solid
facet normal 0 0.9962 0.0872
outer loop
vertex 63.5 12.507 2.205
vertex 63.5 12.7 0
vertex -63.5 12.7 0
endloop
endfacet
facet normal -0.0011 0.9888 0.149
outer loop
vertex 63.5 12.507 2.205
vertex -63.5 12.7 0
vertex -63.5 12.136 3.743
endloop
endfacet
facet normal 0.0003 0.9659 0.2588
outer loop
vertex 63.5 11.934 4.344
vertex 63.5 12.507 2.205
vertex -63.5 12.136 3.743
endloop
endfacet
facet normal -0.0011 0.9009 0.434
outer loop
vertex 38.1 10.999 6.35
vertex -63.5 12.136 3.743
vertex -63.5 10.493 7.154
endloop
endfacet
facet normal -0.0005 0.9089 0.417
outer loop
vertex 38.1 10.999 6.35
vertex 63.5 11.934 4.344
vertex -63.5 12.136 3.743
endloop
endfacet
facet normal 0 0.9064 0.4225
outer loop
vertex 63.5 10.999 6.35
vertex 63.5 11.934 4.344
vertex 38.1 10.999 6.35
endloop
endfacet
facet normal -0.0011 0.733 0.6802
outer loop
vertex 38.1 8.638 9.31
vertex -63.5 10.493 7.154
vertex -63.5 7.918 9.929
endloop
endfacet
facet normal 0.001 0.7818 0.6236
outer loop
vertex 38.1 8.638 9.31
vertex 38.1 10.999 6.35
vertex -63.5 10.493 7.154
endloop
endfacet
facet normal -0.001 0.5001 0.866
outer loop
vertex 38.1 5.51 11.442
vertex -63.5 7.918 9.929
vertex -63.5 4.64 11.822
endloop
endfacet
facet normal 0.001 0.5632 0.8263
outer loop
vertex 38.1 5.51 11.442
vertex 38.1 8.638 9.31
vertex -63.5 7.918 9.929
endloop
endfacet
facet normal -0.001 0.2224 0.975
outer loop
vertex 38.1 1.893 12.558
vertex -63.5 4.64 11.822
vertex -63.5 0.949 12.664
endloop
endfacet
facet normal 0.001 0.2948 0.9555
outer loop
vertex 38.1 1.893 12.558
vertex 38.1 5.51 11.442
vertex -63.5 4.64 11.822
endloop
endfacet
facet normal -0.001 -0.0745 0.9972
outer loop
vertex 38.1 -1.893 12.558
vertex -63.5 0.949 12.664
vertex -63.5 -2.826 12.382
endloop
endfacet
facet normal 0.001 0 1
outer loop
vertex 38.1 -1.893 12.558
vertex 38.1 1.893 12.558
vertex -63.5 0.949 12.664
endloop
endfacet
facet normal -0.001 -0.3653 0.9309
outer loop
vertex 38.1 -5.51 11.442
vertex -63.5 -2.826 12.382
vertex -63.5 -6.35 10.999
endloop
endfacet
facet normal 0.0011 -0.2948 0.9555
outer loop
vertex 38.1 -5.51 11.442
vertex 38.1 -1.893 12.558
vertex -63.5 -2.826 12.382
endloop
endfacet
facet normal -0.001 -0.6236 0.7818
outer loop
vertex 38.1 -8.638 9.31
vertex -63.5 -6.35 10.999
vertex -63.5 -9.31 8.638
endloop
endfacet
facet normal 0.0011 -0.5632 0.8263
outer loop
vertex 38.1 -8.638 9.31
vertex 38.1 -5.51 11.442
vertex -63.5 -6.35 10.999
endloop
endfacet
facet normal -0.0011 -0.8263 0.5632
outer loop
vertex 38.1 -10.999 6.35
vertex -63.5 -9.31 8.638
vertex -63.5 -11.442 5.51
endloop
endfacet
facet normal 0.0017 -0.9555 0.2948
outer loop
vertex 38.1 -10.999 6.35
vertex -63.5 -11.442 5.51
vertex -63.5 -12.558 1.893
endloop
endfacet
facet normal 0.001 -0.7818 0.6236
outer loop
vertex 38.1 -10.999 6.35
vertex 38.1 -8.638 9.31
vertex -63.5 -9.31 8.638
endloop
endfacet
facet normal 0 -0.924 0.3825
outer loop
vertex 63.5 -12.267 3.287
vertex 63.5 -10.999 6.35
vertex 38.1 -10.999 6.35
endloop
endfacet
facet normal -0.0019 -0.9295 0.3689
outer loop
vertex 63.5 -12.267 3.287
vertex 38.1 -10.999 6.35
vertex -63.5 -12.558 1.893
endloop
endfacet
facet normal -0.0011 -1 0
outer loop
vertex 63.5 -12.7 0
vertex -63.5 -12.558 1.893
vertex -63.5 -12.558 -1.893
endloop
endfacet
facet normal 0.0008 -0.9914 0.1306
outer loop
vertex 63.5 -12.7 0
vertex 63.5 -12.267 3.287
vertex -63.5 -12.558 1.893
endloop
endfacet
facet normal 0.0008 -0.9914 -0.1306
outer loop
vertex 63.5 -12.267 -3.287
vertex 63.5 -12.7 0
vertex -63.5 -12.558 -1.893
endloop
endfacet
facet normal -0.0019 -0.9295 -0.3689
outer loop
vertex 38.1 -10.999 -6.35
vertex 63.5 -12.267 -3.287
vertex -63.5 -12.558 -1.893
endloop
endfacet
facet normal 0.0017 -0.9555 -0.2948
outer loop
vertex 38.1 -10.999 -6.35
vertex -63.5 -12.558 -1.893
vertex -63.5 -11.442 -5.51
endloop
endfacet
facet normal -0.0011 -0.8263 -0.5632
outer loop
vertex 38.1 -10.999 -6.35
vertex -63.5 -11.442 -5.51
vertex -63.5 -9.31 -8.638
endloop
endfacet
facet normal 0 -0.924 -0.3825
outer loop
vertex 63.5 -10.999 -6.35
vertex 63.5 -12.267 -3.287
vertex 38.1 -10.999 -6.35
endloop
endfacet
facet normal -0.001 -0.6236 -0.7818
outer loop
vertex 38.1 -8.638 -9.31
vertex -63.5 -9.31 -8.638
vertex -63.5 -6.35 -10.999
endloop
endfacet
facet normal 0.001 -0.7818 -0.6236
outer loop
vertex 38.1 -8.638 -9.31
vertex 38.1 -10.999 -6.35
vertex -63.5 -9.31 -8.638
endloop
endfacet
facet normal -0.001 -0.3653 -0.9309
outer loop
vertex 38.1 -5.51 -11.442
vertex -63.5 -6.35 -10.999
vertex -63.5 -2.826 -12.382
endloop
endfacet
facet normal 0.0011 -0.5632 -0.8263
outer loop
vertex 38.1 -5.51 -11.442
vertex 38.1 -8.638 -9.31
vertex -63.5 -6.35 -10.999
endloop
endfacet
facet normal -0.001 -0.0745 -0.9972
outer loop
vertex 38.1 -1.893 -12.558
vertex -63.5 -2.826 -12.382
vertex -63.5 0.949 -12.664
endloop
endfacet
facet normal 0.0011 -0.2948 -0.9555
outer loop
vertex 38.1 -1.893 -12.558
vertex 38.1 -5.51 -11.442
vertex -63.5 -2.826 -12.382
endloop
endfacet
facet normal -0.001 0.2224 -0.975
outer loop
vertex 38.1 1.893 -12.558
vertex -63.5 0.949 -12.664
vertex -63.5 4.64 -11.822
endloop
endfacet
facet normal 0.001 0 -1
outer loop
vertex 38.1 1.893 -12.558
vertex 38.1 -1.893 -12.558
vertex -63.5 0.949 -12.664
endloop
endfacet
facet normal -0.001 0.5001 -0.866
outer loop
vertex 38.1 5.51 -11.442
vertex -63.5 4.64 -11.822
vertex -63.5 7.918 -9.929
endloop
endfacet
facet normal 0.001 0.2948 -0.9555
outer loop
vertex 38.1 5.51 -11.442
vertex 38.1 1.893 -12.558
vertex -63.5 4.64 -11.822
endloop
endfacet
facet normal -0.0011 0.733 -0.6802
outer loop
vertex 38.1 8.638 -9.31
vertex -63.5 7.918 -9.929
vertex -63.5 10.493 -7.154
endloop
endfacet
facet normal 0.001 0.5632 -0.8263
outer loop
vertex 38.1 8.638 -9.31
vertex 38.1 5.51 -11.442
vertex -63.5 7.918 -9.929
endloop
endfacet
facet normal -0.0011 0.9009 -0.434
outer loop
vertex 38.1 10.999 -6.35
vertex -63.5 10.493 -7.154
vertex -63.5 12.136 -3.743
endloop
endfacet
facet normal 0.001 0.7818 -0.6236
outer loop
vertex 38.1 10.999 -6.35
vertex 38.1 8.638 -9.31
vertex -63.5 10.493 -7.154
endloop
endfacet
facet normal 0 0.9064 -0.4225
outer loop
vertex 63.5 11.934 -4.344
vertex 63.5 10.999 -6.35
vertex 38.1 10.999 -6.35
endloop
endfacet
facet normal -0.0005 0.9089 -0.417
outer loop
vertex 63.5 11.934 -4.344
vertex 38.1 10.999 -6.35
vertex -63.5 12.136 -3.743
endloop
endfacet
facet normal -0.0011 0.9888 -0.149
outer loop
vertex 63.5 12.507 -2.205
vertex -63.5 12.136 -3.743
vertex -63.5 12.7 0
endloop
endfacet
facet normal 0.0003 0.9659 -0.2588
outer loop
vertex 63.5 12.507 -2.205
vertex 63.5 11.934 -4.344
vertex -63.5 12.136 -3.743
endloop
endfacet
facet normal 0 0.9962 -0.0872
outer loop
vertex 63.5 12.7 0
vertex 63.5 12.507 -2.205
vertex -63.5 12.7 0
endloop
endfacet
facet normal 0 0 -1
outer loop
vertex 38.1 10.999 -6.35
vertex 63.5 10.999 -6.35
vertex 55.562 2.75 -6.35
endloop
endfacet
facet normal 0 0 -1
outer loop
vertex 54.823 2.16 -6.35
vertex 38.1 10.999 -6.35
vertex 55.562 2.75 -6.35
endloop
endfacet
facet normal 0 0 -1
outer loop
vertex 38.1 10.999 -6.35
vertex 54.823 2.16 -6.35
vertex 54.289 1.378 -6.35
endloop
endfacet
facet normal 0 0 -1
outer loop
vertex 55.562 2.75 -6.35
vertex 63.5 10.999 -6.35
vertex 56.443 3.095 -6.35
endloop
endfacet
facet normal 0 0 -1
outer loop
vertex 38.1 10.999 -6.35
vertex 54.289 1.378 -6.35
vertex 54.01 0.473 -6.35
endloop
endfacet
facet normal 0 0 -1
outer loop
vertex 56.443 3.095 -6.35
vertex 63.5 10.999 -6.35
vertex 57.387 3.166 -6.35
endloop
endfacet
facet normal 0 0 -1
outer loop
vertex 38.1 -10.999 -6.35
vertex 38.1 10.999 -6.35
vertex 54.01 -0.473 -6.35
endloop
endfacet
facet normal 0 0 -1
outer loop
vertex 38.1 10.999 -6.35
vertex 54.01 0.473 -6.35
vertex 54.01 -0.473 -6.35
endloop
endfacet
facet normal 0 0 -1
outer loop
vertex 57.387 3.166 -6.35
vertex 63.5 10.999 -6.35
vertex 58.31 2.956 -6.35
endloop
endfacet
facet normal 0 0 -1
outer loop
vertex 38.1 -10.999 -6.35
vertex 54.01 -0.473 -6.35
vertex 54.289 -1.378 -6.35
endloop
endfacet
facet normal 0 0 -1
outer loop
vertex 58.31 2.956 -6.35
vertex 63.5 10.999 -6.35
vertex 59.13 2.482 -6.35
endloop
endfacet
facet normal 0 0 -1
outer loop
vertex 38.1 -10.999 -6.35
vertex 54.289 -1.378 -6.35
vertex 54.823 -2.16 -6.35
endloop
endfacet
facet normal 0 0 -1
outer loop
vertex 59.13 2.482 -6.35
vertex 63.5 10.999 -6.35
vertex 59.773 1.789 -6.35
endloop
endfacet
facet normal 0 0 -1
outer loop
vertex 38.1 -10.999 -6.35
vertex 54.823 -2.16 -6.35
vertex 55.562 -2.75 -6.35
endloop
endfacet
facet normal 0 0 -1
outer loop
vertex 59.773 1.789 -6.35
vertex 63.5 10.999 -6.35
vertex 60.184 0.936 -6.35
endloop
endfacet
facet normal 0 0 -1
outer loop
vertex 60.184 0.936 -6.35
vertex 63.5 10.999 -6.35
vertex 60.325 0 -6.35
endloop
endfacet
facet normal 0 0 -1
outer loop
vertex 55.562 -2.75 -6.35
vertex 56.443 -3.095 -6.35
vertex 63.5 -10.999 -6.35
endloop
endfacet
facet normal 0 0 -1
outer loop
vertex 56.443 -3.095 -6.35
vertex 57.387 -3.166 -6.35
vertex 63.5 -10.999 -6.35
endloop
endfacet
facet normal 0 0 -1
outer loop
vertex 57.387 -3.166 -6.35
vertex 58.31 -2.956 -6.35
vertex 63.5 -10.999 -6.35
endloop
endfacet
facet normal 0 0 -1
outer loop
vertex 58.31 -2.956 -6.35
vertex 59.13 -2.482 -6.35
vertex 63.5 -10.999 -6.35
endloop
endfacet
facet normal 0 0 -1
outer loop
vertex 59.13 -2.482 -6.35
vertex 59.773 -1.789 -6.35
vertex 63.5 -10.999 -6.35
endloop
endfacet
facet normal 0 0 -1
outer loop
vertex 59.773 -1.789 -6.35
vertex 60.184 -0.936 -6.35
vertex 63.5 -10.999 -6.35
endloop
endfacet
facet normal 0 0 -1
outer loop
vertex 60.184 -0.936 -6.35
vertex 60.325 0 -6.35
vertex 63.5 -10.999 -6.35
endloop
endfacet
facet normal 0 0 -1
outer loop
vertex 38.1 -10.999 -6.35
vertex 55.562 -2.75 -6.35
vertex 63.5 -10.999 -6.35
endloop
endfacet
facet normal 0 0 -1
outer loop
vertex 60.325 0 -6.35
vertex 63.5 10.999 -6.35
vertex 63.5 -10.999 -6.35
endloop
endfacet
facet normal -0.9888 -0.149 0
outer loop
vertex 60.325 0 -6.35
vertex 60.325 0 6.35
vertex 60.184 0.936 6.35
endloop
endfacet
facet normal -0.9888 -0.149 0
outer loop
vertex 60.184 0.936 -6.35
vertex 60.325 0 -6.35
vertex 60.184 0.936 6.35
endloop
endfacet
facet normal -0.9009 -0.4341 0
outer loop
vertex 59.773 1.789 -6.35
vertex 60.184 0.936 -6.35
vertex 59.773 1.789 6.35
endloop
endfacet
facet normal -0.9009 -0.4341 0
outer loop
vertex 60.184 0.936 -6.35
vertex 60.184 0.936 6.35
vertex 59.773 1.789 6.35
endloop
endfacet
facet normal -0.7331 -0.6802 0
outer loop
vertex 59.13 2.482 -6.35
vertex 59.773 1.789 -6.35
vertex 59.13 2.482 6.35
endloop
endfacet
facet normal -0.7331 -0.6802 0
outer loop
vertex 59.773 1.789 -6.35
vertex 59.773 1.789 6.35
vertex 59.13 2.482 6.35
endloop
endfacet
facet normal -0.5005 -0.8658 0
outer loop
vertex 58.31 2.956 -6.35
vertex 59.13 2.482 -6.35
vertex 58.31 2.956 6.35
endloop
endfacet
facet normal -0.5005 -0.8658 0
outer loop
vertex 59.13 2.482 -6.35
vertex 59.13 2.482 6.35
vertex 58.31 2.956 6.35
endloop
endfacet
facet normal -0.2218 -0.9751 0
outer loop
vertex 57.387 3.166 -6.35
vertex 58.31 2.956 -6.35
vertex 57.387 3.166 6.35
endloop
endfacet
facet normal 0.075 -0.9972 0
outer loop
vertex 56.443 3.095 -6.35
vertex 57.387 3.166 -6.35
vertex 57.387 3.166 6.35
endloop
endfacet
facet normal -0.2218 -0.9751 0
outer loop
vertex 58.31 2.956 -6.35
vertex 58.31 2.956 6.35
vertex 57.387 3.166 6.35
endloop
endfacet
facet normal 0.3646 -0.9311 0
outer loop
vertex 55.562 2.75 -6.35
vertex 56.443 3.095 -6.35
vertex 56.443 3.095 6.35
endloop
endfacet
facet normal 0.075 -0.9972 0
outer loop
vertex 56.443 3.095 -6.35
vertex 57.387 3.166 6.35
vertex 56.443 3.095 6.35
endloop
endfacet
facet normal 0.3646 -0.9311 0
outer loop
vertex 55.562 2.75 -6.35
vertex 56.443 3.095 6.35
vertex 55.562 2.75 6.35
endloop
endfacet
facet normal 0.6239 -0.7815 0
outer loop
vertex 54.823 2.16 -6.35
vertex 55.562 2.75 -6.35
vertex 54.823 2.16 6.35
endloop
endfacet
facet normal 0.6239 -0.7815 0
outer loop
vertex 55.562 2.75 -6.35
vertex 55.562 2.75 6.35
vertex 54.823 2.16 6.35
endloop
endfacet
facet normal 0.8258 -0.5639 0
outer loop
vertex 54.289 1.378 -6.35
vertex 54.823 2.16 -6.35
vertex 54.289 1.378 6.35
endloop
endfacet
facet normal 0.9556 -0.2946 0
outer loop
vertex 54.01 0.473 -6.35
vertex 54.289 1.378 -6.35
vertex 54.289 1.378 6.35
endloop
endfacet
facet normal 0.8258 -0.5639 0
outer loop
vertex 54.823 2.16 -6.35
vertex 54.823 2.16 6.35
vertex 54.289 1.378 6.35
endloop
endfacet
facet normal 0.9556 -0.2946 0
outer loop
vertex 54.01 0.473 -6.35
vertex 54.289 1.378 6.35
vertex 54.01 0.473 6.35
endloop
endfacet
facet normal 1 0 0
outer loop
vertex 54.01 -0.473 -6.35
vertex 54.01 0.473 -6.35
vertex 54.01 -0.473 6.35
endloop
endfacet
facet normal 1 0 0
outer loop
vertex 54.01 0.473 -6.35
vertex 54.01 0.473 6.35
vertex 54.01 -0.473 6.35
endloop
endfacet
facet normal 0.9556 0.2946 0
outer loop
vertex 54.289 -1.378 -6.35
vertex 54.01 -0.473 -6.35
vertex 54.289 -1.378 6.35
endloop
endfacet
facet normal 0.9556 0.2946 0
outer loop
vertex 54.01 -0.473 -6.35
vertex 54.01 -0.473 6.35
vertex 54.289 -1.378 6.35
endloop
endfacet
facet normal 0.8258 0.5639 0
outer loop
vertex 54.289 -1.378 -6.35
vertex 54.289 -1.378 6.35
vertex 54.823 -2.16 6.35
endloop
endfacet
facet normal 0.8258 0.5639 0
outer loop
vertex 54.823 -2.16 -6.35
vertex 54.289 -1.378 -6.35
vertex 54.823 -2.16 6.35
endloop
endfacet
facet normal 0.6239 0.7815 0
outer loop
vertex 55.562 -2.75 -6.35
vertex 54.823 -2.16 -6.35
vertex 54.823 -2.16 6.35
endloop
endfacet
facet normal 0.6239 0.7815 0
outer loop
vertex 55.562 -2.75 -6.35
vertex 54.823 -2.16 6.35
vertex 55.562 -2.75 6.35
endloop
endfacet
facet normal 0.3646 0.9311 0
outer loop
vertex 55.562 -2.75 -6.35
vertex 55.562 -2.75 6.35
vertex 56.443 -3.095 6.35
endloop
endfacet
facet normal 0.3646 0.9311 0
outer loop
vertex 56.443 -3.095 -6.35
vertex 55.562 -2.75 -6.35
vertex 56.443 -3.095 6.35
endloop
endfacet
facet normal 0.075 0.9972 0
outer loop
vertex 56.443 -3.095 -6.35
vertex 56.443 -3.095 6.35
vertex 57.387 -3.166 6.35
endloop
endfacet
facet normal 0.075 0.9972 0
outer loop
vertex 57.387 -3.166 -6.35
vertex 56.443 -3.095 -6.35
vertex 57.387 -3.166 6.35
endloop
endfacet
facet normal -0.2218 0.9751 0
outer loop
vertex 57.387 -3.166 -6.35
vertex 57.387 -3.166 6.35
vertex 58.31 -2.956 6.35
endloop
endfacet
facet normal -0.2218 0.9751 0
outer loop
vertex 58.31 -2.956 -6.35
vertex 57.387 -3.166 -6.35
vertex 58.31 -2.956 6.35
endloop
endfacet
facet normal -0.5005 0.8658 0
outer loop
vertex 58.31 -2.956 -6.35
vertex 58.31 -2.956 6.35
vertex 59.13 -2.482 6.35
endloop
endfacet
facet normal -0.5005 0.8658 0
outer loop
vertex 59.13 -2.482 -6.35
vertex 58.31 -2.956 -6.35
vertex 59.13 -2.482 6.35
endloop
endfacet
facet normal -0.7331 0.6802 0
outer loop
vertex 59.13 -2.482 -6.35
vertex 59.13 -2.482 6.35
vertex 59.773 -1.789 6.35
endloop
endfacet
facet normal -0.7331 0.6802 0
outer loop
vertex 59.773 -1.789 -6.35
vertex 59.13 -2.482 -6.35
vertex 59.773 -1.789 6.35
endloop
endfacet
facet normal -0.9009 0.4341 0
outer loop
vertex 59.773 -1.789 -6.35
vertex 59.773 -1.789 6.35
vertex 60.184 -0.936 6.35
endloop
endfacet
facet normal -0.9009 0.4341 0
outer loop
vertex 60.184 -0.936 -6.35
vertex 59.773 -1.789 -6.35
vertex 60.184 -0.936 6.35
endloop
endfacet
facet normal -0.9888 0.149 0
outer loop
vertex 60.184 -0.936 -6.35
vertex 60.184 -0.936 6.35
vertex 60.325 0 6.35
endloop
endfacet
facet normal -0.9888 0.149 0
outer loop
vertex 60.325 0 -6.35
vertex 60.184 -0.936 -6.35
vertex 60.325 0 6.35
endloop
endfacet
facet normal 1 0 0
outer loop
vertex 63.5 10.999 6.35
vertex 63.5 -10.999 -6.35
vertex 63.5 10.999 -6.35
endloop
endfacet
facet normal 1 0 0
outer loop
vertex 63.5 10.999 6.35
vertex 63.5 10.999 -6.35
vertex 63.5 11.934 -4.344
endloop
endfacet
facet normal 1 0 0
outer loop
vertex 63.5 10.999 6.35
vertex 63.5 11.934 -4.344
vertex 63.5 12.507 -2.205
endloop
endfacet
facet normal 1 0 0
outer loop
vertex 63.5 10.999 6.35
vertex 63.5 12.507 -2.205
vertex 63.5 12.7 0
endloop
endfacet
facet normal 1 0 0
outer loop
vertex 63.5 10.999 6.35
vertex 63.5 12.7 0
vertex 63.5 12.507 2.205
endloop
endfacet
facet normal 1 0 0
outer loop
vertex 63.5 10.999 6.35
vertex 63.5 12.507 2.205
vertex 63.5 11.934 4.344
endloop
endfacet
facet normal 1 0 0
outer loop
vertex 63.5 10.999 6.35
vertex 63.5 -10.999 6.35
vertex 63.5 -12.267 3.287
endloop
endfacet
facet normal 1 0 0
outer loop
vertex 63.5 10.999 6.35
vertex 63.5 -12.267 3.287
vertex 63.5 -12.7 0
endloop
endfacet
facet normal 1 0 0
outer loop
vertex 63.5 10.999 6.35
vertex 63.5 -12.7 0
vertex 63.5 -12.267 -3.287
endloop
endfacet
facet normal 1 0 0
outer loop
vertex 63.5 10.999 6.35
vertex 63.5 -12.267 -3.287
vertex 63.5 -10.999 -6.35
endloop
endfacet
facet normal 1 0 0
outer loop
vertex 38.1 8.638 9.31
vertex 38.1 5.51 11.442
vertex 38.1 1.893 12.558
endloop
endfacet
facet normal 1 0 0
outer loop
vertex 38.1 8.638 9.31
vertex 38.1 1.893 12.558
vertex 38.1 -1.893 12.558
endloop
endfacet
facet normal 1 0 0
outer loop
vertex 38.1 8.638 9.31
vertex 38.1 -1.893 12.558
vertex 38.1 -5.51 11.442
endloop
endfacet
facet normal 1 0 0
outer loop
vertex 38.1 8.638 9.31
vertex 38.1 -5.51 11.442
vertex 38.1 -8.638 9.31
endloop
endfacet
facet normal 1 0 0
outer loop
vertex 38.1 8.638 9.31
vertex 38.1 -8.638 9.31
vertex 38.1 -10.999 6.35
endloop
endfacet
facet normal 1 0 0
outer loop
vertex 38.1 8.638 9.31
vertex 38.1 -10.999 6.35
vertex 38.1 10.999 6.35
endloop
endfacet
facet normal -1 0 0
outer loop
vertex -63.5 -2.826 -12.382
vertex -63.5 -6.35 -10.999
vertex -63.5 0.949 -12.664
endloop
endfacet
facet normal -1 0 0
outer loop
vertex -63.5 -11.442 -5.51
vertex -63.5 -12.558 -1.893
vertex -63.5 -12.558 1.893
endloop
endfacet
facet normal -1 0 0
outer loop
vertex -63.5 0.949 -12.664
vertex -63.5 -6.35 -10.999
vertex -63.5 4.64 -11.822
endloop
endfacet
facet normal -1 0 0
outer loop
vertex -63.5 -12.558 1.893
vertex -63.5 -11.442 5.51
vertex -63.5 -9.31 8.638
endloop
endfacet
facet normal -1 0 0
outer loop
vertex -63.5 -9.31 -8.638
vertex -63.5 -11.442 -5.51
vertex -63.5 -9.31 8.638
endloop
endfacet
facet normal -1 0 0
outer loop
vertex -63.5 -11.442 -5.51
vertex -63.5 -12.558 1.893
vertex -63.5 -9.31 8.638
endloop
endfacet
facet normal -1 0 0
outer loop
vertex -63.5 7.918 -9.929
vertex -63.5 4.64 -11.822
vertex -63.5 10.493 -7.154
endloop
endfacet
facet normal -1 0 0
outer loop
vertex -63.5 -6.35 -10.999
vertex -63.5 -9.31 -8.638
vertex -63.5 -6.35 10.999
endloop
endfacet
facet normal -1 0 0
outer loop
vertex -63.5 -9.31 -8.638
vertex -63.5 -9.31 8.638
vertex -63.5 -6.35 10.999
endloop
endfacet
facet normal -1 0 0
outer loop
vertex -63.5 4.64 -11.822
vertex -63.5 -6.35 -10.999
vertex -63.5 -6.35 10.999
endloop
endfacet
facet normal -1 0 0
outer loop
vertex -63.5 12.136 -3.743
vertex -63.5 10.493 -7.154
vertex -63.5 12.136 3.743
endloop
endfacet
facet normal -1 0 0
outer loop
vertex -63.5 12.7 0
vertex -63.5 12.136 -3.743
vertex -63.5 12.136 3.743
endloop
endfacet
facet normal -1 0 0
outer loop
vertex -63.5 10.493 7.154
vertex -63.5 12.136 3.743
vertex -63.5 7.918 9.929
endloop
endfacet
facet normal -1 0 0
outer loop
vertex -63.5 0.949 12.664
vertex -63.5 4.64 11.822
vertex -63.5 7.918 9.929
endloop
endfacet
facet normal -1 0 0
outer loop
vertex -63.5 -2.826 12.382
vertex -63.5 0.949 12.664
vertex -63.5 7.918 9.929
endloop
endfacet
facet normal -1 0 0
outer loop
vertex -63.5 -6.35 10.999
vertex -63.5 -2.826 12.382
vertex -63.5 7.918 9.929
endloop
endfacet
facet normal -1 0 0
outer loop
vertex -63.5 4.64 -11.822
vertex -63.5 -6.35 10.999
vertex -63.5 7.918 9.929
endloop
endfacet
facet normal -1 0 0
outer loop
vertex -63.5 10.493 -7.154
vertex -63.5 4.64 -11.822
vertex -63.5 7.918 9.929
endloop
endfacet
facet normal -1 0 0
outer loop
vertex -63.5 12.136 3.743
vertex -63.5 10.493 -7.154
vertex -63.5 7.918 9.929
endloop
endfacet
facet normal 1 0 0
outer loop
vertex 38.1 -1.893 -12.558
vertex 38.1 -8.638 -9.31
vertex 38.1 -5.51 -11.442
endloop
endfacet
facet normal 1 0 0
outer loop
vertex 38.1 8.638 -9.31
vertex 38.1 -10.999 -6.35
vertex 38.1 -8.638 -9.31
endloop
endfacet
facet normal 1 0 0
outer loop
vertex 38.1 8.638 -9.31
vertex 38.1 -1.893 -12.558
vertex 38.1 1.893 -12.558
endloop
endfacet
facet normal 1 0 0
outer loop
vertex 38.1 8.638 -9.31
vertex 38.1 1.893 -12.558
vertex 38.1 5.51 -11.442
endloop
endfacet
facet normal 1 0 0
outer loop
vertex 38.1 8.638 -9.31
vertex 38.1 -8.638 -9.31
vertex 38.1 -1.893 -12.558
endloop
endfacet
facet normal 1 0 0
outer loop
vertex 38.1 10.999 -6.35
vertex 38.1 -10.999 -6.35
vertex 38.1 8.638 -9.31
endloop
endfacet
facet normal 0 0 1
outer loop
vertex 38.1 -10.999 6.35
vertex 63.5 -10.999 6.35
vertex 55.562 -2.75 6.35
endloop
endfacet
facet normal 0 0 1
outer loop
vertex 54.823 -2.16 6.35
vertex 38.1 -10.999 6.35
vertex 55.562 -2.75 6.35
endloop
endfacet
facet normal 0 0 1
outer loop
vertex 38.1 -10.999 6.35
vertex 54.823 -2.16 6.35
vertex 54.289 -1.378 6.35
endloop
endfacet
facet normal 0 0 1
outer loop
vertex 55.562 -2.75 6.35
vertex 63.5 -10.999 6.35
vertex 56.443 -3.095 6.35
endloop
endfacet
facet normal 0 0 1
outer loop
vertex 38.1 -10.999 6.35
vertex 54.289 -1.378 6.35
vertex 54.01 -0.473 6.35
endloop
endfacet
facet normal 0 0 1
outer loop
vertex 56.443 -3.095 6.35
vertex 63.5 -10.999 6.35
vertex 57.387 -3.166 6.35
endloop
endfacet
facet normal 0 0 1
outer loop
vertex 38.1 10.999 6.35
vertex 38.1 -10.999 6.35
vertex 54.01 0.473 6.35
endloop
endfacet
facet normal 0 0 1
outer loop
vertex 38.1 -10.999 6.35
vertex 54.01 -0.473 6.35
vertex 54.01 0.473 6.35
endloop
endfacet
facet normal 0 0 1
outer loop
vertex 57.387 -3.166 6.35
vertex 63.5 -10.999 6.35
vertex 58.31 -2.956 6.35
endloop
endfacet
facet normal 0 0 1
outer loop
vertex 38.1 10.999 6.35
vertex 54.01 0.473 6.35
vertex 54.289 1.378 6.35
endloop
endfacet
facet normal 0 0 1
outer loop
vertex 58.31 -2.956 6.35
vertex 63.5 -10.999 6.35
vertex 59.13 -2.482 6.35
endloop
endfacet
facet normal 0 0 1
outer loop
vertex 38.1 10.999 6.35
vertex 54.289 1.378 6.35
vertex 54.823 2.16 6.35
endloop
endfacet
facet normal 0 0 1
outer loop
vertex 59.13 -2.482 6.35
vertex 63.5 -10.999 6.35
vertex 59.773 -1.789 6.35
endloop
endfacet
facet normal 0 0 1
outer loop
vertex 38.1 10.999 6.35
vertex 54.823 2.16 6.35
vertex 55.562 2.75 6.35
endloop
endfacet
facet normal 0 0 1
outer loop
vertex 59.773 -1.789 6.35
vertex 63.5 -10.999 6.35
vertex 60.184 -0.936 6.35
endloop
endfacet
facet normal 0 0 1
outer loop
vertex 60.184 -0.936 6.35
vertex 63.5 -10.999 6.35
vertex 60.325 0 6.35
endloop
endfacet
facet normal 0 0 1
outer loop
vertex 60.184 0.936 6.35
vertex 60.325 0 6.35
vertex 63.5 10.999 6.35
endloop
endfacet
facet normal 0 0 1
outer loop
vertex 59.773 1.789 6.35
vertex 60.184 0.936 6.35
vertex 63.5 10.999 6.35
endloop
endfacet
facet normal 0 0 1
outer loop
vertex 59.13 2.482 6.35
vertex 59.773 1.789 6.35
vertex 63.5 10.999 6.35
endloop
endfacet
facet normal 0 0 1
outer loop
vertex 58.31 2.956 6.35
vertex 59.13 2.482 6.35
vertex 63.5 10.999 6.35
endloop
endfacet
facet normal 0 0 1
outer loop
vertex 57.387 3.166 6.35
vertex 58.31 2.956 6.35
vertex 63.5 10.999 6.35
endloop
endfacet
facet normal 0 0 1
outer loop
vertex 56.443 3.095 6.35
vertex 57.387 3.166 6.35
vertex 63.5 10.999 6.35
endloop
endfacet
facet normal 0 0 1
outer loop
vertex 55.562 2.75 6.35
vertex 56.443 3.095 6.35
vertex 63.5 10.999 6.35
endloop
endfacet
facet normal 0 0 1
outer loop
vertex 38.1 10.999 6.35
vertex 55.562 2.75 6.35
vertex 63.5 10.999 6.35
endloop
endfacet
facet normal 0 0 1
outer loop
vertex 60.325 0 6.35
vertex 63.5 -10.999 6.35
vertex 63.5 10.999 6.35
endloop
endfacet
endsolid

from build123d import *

# Parameters (mm, degrees)
F0_R     = 12.7
F1_DEPTH = 63.5
F3_DEPTH = 25.4
F4_R     = 3.175
F5_DEPTH = 19.051


with BuildPart() as f1:
    # F0 (on Right) → F1 (new body, symmetric)
    with BuildSketch(Plane.YZ):
        Circle(F0_R)
    extrude(amount=F1_DEPTH, both=True)

    # F2 (on face) → F3 (cut)
    with BuildSketch(Plane.YZ.offset(63.5)):
        with BuildLine():
            Line((10.998523, -6.35), (-10.998523, -6.35))
            ThreePointArc((-10.998523, -6.35), (0, -12.7), (10.998523, -6.35))
        make_face()
        with BuildLine():
            ThreePointArc((10.998523, 6.35), (0, 12.7), (-10.998523, 6.35))
            Line((-10.998523, 6.35), (10.998523, 6.35))
        make_face()
    extrude(amount=-F3_DEPTH, mode=Mode.SUBTRACT)

    # F4 (on face) → F5 (cut, through all)
    with BuildSketch(Plane.XY.offset(6.35)):
        with Locations((57.15, 0)):
            Circle(F4_R)
    extrude(amount=-F5_DEPTH, mode=Mode.SUBTRACT)


solid = f1.part
